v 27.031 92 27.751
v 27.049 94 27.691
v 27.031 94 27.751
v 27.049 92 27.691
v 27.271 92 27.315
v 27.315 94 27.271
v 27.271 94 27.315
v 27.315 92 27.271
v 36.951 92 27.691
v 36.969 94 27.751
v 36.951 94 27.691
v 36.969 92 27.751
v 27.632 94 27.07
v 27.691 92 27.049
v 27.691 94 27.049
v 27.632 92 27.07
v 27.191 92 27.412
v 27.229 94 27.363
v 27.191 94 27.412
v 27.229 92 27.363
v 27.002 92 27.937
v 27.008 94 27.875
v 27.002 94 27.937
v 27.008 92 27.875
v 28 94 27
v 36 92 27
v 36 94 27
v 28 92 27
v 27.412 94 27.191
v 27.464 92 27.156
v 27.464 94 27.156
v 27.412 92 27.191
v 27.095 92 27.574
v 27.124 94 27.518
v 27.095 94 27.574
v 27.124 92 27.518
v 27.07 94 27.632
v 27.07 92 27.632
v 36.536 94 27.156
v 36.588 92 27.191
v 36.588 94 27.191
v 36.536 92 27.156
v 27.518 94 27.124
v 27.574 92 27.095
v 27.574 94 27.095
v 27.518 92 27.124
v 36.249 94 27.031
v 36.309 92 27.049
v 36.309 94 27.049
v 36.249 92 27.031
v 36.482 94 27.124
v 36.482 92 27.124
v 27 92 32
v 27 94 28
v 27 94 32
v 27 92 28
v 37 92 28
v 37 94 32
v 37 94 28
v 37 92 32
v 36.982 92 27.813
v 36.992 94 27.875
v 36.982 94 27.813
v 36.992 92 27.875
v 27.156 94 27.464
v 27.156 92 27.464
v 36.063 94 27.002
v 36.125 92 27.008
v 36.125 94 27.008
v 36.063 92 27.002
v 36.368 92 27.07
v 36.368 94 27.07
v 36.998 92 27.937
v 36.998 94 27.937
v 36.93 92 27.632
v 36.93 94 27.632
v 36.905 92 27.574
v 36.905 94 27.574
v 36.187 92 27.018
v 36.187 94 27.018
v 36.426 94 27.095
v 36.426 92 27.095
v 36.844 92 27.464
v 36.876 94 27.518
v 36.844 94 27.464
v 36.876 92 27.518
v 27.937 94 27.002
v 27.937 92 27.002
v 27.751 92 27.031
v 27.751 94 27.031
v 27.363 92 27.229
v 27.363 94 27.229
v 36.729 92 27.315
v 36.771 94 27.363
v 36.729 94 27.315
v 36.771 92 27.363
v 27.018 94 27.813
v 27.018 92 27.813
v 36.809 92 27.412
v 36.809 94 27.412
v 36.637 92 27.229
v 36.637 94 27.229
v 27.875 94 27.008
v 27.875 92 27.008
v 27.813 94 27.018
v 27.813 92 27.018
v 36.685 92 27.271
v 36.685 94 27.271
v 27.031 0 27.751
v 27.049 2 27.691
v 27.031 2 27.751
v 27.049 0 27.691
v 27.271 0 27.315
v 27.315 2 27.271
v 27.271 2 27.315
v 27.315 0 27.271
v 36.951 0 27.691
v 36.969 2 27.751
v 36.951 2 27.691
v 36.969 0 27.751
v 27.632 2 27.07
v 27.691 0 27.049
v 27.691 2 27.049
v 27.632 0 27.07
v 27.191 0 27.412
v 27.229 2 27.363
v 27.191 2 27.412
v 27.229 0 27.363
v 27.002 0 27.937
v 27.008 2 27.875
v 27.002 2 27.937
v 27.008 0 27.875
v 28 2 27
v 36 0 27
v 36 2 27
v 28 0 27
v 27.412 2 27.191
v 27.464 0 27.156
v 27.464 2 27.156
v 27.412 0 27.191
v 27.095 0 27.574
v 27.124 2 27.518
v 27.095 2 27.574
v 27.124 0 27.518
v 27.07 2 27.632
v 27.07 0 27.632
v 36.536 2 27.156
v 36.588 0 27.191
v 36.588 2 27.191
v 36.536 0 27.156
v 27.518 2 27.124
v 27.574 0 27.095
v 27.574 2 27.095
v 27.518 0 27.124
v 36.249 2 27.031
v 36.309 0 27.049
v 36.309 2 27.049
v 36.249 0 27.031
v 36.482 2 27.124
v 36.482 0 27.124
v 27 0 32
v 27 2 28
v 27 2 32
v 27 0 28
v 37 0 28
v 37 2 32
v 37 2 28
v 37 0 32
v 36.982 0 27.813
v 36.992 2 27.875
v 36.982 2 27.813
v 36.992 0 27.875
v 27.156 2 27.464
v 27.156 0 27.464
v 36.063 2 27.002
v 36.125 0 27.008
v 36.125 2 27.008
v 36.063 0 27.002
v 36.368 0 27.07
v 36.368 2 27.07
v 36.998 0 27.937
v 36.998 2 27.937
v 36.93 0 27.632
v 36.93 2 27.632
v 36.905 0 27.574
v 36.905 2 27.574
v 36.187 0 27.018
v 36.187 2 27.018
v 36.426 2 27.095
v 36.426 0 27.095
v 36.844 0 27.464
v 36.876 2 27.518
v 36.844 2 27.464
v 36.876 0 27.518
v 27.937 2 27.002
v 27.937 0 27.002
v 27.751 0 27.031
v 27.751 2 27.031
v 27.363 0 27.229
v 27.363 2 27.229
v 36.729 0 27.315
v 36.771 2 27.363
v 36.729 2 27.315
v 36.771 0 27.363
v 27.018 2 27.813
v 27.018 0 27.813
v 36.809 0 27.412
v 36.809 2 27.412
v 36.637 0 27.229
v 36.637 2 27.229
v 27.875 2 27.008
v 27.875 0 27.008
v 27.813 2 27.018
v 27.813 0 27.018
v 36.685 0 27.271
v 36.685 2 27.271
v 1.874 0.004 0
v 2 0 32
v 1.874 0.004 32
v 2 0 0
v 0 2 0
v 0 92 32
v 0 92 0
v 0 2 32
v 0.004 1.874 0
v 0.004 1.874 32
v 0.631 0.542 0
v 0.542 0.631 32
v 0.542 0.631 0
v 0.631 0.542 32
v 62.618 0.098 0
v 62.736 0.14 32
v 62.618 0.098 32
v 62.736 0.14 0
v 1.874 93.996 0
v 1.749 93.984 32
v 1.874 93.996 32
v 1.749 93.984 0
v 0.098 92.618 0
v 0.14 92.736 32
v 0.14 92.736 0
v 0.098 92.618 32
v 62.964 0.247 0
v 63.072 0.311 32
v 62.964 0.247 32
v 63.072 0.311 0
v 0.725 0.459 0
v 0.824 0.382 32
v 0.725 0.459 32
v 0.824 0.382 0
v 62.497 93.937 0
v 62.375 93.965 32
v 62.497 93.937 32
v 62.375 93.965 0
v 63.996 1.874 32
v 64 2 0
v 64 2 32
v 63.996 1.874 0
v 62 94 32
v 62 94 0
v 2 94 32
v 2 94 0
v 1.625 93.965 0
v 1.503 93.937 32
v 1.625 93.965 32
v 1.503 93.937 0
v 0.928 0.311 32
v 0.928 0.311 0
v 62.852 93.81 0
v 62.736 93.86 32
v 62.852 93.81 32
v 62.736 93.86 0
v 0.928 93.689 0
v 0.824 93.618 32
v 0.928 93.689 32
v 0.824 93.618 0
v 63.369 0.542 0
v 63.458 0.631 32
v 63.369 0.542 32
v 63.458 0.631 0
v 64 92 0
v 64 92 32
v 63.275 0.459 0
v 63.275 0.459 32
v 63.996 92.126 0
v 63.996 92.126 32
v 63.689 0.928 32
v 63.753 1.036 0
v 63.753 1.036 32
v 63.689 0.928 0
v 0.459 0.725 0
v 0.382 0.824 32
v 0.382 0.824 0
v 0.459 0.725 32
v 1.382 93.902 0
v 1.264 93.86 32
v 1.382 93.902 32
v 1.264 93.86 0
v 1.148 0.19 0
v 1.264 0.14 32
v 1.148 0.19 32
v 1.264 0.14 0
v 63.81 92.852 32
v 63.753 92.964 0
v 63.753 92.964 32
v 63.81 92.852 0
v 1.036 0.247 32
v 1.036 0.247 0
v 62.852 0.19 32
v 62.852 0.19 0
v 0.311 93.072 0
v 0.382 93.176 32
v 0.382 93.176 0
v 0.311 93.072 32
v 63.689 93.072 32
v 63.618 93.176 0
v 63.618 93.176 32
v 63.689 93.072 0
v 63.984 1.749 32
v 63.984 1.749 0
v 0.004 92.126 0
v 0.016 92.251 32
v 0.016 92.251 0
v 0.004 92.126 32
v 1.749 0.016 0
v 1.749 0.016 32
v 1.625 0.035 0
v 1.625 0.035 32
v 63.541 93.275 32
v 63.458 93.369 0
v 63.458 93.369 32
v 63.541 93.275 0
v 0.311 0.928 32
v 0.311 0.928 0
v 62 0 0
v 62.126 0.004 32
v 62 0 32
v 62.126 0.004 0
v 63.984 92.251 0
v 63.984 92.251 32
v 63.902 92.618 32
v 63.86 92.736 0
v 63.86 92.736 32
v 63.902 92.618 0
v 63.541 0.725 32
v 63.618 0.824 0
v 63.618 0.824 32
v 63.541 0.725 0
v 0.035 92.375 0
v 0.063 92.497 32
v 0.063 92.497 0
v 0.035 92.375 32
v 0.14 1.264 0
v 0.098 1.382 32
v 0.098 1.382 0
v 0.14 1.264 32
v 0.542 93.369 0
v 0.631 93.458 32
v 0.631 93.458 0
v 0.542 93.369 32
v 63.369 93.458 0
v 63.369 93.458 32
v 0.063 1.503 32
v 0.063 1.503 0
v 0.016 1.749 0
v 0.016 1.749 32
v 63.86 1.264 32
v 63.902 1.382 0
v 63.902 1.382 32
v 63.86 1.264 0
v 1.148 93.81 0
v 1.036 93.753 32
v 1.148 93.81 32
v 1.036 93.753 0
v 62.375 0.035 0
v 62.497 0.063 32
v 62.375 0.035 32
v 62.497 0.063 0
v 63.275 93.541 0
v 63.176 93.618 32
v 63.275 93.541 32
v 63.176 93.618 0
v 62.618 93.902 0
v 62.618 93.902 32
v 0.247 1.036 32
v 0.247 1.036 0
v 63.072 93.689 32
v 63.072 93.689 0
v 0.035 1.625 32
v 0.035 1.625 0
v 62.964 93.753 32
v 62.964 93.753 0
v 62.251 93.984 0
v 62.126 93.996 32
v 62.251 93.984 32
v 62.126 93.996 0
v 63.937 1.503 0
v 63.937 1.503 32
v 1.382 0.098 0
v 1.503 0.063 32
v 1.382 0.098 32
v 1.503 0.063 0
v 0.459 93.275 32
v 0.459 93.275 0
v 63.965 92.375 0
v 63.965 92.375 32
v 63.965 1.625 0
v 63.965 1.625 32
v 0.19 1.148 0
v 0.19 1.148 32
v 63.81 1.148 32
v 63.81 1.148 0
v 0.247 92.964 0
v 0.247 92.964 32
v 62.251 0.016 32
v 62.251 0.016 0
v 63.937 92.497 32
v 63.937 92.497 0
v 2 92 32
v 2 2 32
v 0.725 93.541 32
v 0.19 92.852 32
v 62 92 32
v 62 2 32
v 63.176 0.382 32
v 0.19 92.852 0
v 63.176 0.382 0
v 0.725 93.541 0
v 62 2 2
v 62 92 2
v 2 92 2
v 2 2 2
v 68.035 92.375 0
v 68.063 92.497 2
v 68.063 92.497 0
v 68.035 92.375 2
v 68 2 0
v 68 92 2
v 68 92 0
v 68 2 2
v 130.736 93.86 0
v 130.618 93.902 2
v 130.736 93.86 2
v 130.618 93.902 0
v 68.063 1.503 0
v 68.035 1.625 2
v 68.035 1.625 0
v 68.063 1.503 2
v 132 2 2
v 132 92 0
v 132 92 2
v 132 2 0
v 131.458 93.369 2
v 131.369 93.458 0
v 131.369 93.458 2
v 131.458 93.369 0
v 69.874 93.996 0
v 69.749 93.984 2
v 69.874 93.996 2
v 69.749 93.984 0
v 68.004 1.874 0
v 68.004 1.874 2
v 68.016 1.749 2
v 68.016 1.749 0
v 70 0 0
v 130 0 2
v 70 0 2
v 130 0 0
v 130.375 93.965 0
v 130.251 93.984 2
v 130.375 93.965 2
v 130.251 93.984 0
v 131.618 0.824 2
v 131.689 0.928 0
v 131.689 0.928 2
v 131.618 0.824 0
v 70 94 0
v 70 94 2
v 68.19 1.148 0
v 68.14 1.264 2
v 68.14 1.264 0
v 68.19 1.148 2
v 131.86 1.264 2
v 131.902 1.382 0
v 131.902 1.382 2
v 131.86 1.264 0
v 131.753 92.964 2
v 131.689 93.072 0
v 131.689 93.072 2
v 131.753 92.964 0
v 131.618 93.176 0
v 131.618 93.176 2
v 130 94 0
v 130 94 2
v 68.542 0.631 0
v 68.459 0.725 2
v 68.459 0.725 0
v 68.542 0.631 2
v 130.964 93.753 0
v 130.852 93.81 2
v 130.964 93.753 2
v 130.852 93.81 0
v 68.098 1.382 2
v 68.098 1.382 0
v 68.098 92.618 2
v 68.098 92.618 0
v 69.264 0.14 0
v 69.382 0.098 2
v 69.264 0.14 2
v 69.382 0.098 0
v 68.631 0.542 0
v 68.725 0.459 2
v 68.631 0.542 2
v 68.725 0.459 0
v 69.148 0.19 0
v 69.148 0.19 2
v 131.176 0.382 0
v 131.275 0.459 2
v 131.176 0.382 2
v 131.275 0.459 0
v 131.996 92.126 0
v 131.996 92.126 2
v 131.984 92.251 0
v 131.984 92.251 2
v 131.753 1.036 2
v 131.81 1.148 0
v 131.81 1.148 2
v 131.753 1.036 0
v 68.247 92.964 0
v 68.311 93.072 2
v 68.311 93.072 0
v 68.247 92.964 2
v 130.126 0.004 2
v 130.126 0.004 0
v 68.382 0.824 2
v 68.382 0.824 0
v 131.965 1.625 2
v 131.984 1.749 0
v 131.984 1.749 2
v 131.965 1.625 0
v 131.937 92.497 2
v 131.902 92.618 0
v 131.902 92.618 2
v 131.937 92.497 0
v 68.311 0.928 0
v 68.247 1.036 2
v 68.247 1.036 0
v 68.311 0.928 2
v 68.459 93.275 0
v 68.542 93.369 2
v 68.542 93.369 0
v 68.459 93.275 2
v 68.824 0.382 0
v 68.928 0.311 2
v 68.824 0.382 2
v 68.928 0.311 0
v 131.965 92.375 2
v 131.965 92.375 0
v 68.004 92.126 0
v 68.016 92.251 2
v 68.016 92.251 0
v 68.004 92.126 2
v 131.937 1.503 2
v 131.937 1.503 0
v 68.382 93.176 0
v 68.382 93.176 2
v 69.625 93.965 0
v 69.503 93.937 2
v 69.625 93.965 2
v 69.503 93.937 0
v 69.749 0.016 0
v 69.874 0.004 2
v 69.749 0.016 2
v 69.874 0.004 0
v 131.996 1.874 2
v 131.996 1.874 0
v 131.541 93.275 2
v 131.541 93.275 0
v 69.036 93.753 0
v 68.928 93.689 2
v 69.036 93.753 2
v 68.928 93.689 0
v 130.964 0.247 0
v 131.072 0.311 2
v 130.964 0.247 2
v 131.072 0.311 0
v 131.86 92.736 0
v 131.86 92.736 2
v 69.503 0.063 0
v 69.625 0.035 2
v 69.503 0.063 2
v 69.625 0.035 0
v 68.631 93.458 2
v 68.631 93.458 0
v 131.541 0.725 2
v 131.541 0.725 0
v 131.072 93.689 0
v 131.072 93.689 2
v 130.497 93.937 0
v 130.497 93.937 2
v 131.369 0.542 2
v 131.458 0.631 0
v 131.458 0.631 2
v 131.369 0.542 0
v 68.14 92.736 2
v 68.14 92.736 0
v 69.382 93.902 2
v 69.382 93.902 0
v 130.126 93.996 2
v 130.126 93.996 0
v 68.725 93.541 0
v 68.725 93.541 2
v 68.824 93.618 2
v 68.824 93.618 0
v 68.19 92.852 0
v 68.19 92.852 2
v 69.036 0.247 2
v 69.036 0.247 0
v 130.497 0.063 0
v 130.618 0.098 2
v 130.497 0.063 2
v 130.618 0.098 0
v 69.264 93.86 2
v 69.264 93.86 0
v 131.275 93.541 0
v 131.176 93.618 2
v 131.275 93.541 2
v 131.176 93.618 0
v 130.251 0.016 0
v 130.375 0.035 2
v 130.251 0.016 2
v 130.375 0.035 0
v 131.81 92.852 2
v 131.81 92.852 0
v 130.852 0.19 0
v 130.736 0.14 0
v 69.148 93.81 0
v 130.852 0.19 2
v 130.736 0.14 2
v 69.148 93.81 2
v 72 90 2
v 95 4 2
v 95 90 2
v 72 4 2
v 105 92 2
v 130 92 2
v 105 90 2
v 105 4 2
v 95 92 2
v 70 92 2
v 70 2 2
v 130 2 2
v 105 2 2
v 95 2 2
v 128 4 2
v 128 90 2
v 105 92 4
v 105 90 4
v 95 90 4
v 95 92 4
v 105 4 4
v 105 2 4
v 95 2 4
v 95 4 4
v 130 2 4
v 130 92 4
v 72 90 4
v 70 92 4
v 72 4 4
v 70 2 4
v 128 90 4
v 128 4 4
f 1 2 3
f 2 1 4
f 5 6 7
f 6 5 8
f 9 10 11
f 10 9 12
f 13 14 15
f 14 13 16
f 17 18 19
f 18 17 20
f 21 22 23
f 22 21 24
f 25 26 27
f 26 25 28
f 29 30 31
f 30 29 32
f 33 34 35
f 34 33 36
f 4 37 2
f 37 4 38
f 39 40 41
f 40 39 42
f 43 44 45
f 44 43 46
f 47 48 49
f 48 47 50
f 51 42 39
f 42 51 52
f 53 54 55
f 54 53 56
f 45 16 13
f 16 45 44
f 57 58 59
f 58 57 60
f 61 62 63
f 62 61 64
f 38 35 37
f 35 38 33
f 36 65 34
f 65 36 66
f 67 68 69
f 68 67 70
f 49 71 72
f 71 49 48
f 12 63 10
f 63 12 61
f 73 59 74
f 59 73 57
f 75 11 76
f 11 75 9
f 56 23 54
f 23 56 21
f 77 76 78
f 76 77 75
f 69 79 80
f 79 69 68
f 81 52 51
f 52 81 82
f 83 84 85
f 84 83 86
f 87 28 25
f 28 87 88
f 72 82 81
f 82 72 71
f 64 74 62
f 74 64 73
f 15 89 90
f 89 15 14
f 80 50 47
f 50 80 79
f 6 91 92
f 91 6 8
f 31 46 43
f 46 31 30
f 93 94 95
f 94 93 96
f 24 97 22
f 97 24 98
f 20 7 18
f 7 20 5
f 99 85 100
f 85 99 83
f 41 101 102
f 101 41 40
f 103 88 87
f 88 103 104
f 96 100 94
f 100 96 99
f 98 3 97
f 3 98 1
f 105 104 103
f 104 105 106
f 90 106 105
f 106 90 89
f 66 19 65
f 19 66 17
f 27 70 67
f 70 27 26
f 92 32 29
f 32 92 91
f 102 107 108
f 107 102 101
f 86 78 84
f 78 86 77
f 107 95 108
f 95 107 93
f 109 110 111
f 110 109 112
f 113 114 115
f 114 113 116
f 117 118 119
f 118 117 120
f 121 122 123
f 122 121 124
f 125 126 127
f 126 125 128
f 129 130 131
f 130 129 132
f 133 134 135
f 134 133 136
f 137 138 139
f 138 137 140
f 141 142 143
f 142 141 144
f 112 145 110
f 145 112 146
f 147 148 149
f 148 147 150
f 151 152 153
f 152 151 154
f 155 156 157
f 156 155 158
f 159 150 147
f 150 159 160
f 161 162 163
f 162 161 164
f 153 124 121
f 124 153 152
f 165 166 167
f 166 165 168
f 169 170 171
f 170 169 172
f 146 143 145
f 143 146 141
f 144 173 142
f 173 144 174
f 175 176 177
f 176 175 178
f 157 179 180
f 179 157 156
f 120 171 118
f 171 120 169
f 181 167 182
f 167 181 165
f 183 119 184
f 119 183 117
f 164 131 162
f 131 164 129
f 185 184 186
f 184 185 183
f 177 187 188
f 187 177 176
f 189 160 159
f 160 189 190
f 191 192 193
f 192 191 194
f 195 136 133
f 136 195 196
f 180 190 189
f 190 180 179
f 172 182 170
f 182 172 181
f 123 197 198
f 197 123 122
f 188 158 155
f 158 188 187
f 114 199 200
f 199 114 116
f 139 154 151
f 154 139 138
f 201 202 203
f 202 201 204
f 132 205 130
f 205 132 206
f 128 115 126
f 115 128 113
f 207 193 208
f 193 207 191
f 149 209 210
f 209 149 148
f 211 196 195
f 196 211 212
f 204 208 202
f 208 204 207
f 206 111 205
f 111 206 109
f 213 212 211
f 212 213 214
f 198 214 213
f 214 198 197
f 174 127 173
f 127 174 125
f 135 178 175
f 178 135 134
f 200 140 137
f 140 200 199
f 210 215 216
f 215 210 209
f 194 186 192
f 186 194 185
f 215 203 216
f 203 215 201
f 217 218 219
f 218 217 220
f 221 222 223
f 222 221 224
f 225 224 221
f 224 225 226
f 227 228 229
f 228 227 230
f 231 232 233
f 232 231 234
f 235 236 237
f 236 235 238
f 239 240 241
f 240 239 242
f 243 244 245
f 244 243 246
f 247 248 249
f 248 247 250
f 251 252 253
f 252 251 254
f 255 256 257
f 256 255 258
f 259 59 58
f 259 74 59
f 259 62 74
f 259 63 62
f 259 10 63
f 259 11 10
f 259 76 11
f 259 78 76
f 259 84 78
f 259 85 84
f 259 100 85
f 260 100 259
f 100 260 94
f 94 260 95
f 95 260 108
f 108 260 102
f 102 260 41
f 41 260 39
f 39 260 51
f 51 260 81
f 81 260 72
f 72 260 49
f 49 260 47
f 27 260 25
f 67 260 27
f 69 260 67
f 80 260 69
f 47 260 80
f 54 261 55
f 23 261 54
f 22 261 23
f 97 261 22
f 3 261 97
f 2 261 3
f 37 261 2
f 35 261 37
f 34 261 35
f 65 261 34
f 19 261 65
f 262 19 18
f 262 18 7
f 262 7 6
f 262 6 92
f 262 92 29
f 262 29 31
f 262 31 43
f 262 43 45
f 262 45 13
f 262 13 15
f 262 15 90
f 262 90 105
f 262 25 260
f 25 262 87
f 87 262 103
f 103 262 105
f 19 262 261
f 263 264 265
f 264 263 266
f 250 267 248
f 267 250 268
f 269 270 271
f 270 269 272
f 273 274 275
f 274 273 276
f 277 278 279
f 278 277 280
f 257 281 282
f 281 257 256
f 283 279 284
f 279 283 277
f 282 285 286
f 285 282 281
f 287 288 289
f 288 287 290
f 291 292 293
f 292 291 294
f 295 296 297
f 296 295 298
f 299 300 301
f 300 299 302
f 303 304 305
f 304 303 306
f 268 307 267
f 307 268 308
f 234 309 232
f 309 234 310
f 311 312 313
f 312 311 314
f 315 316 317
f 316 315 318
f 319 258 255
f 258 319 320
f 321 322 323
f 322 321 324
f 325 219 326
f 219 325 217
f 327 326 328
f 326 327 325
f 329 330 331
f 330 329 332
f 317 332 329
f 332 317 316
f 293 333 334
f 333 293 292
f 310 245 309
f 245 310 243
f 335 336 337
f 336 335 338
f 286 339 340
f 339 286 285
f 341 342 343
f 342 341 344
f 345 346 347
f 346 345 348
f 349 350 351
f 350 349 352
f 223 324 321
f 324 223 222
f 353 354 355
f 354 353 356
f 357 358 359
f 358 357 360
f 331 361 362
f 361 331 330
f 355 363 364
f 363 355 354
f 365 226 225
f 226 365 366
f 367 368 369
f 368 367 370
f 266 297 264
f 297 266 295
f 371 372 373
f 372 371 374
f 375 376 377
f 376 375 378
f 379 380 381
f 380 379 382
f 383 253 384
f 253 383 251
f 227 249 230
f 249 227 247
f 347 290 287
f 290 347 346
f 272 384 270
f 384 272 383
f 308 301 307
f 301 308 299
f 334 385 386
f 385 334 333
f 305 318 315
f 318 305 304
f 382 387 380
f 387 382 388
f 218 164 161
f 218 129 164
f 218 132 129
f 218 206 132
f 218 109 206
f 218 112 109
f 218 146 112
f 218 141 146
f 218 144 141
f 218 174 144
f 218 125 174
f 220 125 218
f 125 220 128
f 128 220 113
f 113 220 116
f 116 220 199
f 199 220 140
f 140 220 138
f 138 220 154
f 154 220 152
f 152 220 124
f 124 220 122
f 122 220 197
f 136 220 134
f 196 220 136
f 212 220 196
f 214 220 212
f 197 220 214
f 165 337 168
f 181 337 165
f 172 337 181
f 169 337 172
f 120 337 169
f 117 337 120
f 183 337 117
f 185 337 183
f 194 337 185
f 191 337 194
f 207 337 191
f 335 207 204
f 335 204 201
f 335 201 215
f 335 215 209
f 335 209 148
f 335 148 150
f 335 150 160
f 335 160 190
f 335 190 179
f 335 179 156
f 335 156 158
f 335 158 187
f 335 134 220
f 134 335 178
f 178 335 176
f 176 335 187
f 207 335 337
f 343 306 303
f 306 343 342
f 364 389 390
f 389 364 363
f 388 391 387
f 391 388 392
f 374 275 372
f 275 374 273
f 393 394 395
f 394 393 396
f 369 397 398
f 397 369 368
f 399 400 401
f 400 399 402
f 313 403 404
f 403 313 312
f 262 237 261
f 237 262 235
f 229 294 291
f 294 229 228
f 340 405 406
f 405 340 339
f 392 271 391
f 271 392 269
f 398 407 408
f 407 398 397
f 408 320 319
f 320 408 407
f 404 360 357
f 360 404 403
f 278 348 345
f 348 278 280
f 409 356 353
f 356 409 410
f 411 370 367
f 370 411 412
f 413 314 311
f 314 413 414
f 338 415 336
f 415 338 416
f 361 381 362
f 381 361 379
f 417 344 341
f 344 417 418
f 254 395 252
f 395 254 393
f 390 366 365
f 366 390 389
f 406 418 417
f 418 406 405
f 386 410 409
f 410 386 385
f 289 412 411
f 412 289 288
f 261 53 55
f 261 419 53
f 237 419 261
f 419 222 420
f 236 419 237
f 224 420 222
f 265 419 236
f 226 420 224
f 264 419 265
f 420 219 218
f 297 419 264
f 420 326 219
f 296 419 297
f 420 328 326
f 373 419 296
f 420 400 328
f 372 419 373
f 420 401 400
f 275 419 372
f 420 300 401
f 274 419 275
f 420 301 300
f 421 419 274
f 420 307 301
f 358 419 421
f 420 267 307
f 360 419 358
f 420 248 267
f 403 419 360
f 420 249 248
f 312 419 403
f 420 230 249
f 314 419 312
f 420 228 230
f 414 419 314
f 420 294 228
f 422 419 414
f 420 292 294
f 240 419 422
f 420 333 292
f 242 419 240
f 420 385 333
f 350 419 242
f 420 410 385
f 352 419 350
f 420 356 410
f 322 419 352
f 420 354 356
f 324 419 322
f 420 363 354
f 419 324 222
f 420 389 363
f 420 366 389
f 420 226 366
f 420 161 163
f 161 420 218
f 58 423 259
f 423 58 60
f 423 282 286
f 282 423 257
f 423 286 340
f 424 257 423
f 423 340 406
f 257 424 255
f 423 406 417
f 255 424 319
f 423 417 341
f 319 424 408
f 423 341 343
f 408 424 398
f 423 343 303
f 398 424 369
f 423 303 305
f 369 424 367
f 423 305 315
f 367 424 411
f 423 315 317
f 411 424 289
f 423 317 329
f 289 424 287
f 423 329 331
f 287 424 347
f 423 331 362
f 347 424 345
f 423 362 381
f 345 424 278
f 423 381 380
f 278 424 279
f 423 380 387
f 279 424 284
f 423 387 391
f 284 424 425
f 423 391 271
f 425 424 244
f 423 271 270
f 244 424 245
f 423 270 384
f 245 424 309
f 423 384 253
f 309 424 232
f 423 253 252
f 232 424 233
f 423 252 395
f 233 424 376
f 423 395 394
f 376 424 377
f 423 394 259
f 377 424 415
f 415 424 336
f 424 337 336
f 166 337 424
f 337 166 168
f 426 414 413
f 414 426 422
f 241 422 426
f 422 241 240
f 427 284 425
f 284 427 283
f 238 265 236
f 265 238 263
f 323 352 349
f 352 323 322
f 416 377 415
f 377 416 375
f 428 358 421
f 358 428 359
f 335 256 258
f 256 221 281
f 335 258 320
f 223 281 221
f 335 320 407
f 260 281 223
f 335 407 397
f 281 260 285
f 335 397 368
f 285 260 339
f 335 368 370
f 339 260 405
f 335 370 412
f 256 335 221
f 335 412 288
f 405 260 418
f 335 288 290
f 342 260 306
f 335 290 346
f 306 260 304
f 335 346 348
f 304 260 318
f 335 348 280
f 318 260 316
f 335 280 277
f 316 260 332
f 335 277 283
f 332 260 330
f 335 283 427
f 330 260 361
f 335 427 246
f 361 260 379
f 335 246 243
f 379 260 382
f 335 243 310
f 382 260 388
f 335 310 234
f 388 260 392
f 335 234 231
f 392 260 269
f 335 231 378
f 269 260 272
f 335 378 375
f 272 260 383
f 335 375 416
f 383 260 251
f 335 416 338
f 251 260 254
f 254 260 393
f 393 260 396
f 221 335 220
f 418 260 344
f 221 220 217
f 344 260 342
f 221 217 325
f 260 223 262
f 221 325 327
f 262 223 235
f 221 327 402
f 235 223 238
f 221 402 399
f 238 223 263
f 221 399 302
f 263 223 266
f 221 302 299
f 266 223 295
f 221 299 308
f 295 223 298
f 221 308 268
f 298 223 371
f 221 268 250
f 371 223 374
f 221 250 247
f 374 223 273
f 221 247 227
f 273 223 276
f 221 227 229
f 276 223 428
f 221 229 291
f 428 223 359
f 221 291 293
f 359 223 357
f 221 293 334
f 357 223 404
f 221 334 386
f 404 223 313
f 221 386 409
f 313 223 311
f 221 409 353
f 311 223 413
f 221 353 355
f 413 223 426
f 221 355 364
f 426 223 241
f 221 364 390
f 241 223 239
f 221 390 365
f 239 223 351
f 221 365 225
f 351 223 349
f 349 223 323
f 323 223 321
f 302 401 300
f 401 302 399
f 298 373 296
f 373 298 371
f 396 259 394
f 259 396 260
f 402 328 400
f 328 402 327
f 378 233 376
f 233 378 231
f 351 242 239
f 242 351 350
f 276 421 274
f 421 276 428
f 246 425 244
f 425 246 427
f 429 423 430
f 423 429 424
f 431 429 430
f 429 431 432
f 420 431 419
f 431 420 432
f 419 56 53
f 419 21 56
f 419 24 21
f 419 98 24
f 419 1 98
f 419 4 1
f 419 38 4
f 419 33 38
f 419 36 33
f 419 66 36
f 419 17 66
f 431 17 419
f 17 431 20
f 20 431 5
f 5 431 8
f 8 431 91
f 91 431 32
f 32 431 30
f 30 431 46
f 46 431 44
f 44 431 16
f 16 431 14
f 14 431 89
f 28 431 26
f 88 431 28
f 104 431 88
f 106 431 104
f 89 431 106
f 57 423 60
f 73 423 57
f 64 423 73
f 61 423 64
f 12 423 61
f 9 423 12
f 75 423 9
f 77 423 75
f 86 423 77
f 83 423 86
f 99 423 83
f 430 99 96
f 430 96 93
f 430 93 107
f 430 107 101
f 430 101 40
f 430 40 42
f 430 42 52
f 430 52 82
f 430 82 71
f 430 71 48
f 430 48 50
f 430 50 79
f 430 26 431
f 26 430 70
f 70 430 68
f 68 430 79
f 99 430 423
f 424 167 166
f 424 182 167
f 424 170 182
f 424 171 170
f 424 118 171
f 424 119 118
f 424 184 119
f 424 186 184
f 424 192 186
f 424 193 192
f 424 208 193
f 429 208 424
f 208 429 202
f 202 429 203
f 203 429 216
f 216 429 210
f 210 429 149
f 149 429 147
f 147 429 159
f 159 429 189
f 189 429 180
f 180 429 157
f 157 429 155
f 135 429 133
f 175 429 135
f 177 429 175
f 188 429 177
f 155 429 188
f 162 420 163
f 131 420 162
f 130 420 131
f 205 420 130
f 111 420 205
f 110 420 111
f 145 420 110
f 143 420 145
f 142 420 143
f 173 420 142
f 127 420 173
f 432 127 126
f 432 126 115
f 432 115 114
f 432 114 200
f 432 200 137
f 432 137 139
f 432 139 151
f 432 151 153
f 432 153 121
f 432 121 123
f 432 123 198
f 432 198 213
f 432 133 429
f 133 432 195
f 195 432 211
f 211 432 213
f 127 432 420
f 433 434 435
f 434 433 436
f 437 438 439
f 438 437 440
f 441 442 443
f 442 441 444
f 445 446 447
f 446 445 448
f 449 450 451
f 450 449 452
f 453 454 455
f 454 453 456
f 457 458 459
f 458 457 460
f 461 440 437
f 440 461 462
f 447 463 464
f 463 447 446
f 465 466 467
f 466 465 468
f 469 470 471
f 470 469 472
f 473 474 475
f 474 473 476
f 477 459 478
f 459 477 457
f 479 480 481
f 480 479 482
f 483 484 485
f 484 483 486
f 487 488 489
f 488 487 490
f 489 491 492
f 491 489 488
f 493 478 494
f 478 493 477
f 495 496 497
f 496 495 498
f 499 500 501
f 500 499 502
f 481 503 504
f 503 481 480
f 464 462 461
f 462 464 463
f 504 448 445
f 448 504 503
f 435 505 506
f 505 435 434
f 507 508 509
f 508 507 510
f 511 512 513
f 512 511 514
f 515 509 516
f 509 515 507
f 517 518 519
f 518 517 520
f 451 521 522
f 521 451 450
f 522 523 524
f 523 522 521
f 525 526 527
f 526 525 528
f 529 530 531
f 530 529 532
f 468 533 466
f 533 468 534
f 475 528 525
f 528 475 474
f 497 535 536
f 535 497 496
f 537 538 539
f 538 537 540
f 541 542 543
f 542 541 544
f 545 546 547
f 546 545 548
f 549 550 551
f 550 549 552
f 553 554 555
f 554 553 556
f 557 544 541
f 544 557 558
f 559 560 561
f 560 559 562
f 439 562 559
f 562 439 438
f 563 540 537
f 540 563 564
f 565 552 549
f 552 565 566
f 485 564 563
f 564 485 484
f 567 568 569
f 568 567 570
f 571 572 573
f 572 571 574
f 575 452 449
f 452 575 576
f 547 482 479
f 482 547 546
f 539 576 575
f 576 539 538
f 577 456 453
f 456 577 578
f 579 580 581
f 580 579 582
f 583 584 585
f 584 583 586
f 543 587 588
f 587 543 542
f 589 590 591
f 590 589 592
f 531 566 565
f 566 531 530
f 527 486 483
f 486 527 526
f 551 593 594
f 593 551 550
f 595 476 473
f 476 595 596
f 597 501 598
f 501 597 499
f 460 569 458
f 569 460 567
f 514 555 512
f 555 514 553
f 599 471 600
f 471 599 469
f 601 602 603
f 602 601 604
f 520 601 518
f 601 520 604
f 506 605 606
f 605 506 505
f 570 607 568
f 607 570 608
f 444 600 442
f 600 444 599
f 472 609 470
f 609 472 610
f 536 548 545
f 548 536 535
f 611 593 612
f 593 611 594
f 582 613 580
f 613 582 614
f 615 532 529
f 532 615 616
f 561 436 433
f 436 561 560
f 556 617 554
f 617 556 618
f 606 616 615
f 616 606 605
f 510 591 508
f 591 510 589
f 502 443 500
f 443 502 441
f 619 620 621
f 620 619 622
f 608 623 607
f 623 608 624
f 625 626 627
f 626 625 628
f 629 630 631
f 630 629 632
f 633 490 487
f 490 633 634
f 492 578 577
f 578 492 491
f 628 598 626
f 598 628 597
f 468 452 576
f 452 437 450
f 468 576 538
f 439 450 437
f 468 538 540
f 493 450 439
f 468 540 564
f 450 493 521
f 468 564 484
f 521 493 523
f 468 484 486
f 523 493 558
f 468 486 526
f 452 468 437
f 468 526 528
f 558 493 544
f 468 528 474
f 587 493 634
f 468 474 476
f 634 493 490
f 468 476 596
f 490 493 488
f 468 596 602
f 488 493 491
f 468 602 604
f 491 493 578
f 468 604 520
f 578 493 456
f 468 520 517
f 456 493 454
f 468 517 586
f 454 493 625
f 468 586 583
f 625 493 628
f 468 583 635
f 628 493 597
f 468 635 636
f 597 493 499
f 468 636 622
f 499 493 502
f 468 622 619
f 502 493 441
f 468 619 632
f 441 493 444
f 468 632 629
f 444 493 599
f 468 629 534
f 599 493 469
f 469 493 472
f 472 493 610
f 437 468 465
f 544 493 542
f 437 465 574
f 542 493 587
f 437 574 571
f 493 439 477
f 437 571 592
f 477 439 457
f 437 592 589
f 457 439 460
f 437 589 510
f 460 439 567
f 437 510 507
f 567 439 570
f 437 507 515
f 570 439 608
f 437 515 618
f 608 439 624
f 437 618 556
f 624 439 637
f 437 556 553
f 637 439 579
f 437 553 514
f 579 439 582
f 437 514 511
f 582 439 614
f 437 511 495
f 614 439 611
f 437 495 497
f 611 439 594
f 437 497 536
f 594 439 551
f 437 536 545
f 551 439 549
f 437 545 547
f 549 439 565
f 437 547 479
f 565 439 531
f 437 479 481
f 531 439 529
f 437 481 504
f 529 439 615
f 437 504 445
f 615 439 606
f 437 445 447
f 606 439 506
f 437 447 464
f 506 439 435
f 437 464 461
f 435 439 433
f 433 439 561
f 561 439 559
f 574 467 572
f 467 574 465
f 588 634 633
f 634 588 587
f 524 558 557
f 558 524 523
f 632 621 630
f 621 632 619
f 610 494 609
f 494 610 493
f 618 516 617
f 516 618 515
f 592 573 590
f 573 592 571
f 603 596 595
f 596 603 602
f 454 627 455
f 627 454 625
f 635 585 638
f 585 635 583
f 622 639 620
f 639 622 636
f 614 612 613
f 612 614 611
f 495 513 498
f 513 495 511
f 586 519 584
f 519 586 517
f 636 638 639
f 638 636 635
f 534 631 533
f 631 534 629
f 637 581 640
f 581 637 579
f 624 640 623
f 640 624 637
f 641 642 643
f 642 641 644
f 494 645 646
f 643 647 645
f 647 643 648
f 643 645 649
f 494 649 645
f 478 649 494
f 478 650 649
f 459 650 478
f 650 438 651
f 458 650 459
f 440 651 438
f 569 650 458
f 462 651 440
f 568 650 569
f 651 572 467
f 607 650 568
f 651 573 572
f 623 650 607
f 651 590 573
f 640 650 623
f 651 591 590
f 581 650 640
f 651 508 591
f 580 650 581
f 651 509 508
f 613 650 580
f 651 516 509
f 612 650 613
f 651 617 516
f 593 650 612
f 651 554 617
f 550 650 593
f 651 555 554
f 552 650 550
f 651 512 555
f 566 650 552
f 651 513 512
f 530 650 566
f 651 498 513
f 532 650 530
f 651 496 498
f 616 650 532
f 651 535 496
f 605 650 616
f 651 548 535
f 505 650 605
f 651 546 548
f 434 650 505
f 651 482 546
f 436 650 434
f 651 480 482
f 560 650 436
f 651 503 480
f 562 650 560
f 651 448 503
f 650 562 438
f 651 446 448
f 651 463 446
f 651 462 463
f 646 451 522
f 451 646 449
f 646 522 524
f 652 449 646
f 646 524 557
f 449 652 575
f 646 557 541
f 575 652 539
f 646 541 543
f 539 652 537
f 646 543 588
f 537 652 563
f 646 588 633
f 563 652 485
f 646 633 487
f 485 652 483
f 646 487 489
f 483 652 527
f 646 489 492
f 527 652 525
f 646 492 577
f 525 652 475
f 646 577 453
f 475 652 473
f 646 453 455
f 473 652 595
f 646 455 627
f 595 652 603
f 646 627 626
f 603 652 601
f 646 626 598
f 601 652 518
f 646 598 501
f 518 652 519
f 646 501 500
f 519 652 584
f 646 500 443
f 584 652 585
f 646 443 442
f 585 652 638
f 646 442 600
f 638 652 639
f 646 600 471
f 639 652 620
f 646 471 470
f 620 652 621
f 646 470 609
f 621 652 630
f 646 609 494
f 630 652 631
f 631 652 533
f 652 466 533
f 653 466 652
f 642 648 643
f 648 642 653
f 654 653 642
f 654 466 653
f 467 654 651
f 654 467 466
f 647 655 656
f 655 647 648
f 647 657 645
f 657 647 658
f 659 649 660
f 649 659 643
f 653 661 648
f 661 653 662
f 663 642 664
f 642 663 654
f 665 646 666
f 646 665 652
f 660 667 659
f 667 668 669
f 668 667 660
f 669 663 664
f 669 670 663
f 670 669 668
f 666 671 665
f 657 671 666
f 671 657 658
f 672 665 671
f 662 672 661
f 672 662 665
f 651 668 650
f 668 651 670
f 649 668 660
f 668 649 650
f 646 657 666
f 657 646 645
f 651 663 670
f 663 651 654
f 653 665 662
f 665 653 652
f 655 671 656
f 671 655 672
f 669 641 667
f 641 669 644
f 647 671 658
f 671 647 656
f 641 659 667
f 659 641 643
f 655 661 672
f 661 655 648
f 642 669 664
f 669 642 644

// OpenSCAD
/******************************************************************************
*
* Rounded Box
* v0.1.0
* Kris Noble 2021
* Licence: CC BY 4.0 https://creativecommons.org/licenses/by/4.0/
* Derived from https://www.thingiverse.com/thing:1746190 by Simon John
*
/******************************************************************************/

/******************************************************************************
* Parameters
* All measurements in mm
/******************************************************************************/

/* [Box] */
internal_length = 90;
internal_width  = 60;
internal_height = 30;
wall_thickness  = 2;

print_box = true;
print_lid = true;

/* [Lid] */
lip_width = 2;
lip_height = 2;
// May need adjusting +/- to get a good fit depending on your setup.
lip_clearance = 0;

/* [Holes] */
// Hole format: [<horizontal offset>, <vertical offset>, <hole diameter>]. Offsets are calculated from the centre of the external face as viewed. Side holes are diamonds for easy printing.
holes_n = [];
holes_e = [];
holes_s = [];
holes_w = [];

// Base and lid holes are round.
holes_lid  = [];
holes_base = [];

/* [Cutouts] */
//Cutout format: [<horizontal offset>, <width>, <height>]. Offset is calculated from the centre of the external face as viewed.
cutouts_n = [[0,10,5]];
cutouts_e = [];
cutouts_s = [[0,10,5]];
cutouts_w = [];

// Radius of cutout corners. Limited to (cutout width / 2) and ((cutout height + lip height) / 2) to avoid weirdness.
cutout_radius = 1;
// Remove cutout from lip? If not, cutout heights will account for the lip automatically.
cutout_from_lid = true;

/* [Pins] */
// Pin format: [<horizontal offset>, <vertical offset>, <lower height>, <lower diameter>, <upper height>, <upper diameter>,]. Offsets apply to the central point of the pin and are calculated from the internal south-west / bottom-left of the base or lid as viewed from above. Lid pin offsets do not account for the lip.
pins_base = [];
pins_lid  = [];

/* [Sockets] */
// Socket format: [<horizontal offset>, <vertical offset>, <height>, <inner diameter>, <outer diameter>]. Offsets apply to the central point of the mount and are calculated from the internal south-west / bottom-left of the base or lid as viewed from above. Lid socket offsets do not account for the lip.
sockets_base = [];
sockets_lid  = [];

/* [Settings] */
// Recommended to keep this at 100 but can be adjusted down for quicker rendering.
resolution = 100;

/****************************************
* Edit below this line at your own risk!
/****************************************/

/* [Hidden] */
// Set global resolution and Minkowski cylinder height
$fn = resolution;
cylinder_height = 0.000000001;

// Calculated values
corner_radius = wall_thickness;
external_length = internal_length + (wall_thickness * 2);
external_width = internal_width + (wall_thickness * 2);
box_height = internal_height + wall_thickness; // Height of box without lid

/******************************************************************************
* Modules
/******************************************************************************/

module normalBox(length, width, height)
{
	cube(size=[width,length, height]);
}

module roundedBox(length, width, height, radius, cylinder_height=cylinder_height)
{
	minkowski() {
		cube(size=[width-(radius*2),length-(radius*2), height]);
		cylinder(r=radius, h=cylinder_height);
	}
}

module cutout(length, width, height, radius, cylinder_height=cylinder_height)
{
	minkowski() {
		cube(size=[width-(radius*2),length-(radius*2), height]);
		cylinder(r=radius, h=cylinder_height);
		
	}
	translate([-radius,0,0]){
		cube(size=[width,length, height]);
	}
}

/*****************************************************************************
* Build
/*****************************************************************************/

translate([corner_radius, corner_radius, 0]) {

	/****************************************/
	// Box

	if(print_box) {
		difference() {
			roundedBox(external_length, external_width, box_height, corner_radius); 
			translate([0,0,wall_thickness]) {
				normalBox(internal_length, internal_width, box_height); 
			}
			
			/********************/
			// Holes and cutouts
			
			// North face aka top when viewed from above
			for(hole = holes_n) {
				offset_h = hole[0];
				offset_v = hole[1];
				diameter = hole[2];
				translate([(internal_width/2)-(diameter/2)-offset_h,internal_length+wall_thickness+0.5,(box_height/2)+offset_v]) {
					resize([diameter,wall_thickness+1, diameter]) {
						rotate([90,45,0]) {
							cube([1,1,wall_thickness+1]);
						}
					}
				}
			}
			
			for(cutout = cutouts_n) {
				offset_x = cutout[0];
				width = cutout[1];
				height = cutout_from_lid ? cutout[2] : cutout[2]+lip_height;
				radius = min(cutout_radius, (width/2)-cylinder_height, (height/2)-cylinder_height);
				
				translate([internal_width/2-width/2+radius-offset_x,internal_length+wall_thickness+0.5,(box_height-height)+radius]) {
					rotate([90,0,0]){
						cutout(height,width,wall_thickness+1, radius, wall_thickness+1);
					}
				}
			}
			
			// East aka right
			for(hole = holes_e) {
				offset_h = hole[0];
				offset_v = hole[1];
				diameter = hole[2];
				
				translate([internal_width-0.5,(internal_length/2)-(diameter/2)+offset_h,(box_height/2)+offset_v]) {
					resize([wall_thickness+1, diameter, diameter]) {
						rotate([0,90,0]) {
							rotate([0,0,45]) {
								cube([diameter,diameter,wall_thickness+1]);
							}
						}
					}
				}
			}
			
			for(cutout = cutouts_e) {
				offset_x = cutout[0];
				width = cutout[1];
				height = cutout_from_lid ? cutout[2] : cutout[2]+lip_height;
				radius = min(cutout_radius, (width/2)-cylinder_height, (height/2)-cylinder_height);
				
				translate([internal_width-0.5,(internal_length/2)-(width/2)+radius+offset_x,(box_height-height)+radius]) {
					rotate([0,0,90]) rotate([90,0,0]){
						cutout(height,width,wall_thickness+1, radius);
					}
				}
			}
			
			// South aka bottom
			for(hole = holes_s) {
				offset_h = hole[0];
				offset_v = hole[1];
				diameter = hole[2];
				translate([(internal_width/2)-(diameter/2)+offset_h,0.5,(box_height/2)+offset_v]) {
					resize([diameter,wall_thickness+1, diameter]) {
						rotate([90,45,0]) {
							cube([1,1,wall_thickness+1]);
						}
					}
				}
			}
			
			for(cutout = cutouts_s) {
				offset_x = cutout[0];
				width = cutout[1];
				height = cutout_from_lid ? cutout[2] : cutout[2]+lip_height;
				radius = min(cutout_radius, (width/2)-cylinder_height, (height/2)-cylinder_height);
				
				translate([(internal_width/2)-(width/2)+radius+offset_x,0.5,(box_height-height)+radius]) {
					rotate([90,0,0]){
						cutout(height,width,wall_thickness+1, radius, wall_thickness+1);
					}
				}
				
			}
			
			// West aka left
			for(hole = holes_w) {
				offset_h = hole[0];
				offset_v = hole[1];
				diameter = hole[2];
				
				translate([0-(wall_thickness+0.5),(internal_length/2)-(diameter/2)-offset_h,(box_height/2)+offset_v]) {
					resize([wall_thickness+1, diameter, diameter]) {
						rotate([0,90,0]) {
							rotate([0,0,45]) {
								cube([diameter,diameter,wall_thickness+1]);
							}
						}
					}
				}
			}
			
			for(cutout = cutouts_w) {
				offset_x = cutout[0];
				width = cutout[1];
				height = cutout_from_lid ? cutout[2] : cutout[2]+lip_height;
				radius = min(cutout_radius, (width/2)-cylinder_height, (height/2)-cylinder_height);
				
				translate([-wall_thickness-0.5,(internal_length/2)-(width/2)+radius-offset_x,box_height-height+radius]) {
					rotate([0,0,90]) rotate([90,0,0]){
						cutout(height,width,wall_thickness+1, radius);
					}
				}
			}
			
			// Base 
			for(hole = holes_base) {
				offset_x = hole[0];
				offset_y = hole[1];
				diameter = hole[2];
				translate([(internal_width/2)+offset_x,(internal_length/2)+offset_y,-0.5]) {
					cylinder(r=diameter/2, h=wall_thickness+1);
				}
			}
			
		}
		
		// Pins
		for(pin = pins_base) {
			offset_x = pin[0];
			offset_y = pin[1];
			lower_height = pin[2];
			lower_diameter = pin[3];
			upper_height = pin[4];
			upper_diameter = pin[5];
			
			translate([offset_x+wall_thickness,offset_y+wall_thickness,wall_thickness]) {
				cylinder(r=lower_diameter/2, h=lower_height);
			}
			translate([offset_x+wall_thickness,offset_y+wall_thickness,wall_thickness+lower_height]) {
				cylinder(r=upper_diameter/2, h=upper_height);
			}
		}
		
		// Sockets
		for(socket = sockets_base) {
			offset_x = socket[0];
			offset_y = socket[1];
			height = socket[2];
			inner_diameter = socket[3];
			outer_diameter = socket[4];
			
			difference(){
				translate([offset_x+wall_thickness,offset_y+wall_thickness,wall_thickness]) {
					cylinder(r=(outer_diameter)/2, h=height);
				}
				translate([offset_x+wall_thickness,offset_y+wall_thickness,wall_thickness]) {
					cylinder(r=inner_diameter/2, h=height+0.1);
				}
			}
		}
	}

	/****************************************/
	// Lid

	if(print_lid) {
		translate([external_width+wall_thickness*2, 0, 0]) {
			difference() {
				roundedBox(external_length, external_width, wall_thickness, corner_radius);
				/********************/
				// Lid holes
				for(hole = holes_lid) {
					offset_x = hole[0];
					offset_y = hole[1];
					diameter = hole[2];
					translate([(internal_width/2)+offset_x,(internal_length/2)+offset_y,-0.5]) {
						cylinder(r=diameter/2, h=wall_thickness+1);
					}
				}
			}
			difference() {
				translate([(lip_clearance),(lip_clearance),wall_thickness]) {
					normalBox(internal_length-(lip_clearance*2),internal_width-(lip_clearance*2),lip_height);
				}
				translate([lip_width+lip_clearance,lip_width+lip_clearance,wall_thickness]) {
					normalBox(internal_length-(lip_width*2)-(lip_clearance*2),internal_width-(lip_width*2)-(lip_clearance*2),lip_height+1);
				}
				
				/********************/
				// Lid cutouts
				if(cutout_from_lid){
					for(cutout = cutouts_n) {
						offset_x = cutout[0];
						width = cutout[1];
						
						translate([(internal_width/2)-(width/2)+offset_x,(internal_length-lip_width-lip_clearance)-0.5,wall_thickness]) {
							normalBox(lip_width+1,width,lip_height+0.5);
						}
						
					}
					
					for(cutout = cutouts_e) {
						offset_x = cutout[0];
						width = cutout[1];
						
						translate([lip_clearance-0.5,(internal_length/2)-(width/2)+offset_x,wall_thickness]) {
							normalBox(width,lip_width+1,lip_height+0.5);
						}
						
					}
					
					for(cutout = cutouts_s) {
						offset_x = cutout[0];
						width = cutout[1];
						
						translate([(internal_width/2)-(width/2)-offset_x,lip_clearance-0.5,wall_thickness]) {
							normalBox(lip_width+1,width,lip_height+0.5);
						}
						
					}
					
					for(cutout = cutouts_w) {
						offset_x = cutout[0];
						width = cutout[1];
						
						translate([(internal_width-lip_width)-0.5-lip_clearance,(internal_length/2)-(width/2)-offset_x,wall_thickness]) {
							normalBox(width,lip_width+1,lip_height+0.5);
						}
						
					}
				}
				
			}
			// Pins
				for(pin = pins_lid) {
					offset_x = pin[0];
					offset_y = pin[1];
					lower_height = pin[2];
					lower_diameter = pin[3];
					upper_height = pin[4];
					upper_diameter = pin[5];
					
					translate([offset_x+(wall_thickness),offset_y+(wall_thickness),wall_thickness]) {
						cylinder(r=lower_diameter/2, h=lower_height);
					}
					translate([offset_x+(wall_thickness),offset_y+(wall_thickness),wall_thickness+lower_height]) {
						cylinder(r=upper_diameter/2, h=upper_height);
					}
				}
				
				// Sockets
				for(socket = sockets_lid) {
					offset_x = socket[0];
					offset_y = socket[1];
					height = socket[2];
					inner_diameter = socket[3];
			outer_diameter = socket[4];
					
					difference(){
						translate([offset_x+(lip_clearance)+(wall_thickness),offset_y+lip_clearance+(wall_thickness),wall_thickness]) {
							cylinder(r=(outer_diameter)/2, h=height);
						}
						translate([offset_x+(lip_clearance)+(wall_thickness),offset_y+lip_clearance+(wall_thickness),wall_thickness]) {
							cylinder(r=inner_diameter/2, h=height+0.1);
						}
					}
				}
		}
	}
}
